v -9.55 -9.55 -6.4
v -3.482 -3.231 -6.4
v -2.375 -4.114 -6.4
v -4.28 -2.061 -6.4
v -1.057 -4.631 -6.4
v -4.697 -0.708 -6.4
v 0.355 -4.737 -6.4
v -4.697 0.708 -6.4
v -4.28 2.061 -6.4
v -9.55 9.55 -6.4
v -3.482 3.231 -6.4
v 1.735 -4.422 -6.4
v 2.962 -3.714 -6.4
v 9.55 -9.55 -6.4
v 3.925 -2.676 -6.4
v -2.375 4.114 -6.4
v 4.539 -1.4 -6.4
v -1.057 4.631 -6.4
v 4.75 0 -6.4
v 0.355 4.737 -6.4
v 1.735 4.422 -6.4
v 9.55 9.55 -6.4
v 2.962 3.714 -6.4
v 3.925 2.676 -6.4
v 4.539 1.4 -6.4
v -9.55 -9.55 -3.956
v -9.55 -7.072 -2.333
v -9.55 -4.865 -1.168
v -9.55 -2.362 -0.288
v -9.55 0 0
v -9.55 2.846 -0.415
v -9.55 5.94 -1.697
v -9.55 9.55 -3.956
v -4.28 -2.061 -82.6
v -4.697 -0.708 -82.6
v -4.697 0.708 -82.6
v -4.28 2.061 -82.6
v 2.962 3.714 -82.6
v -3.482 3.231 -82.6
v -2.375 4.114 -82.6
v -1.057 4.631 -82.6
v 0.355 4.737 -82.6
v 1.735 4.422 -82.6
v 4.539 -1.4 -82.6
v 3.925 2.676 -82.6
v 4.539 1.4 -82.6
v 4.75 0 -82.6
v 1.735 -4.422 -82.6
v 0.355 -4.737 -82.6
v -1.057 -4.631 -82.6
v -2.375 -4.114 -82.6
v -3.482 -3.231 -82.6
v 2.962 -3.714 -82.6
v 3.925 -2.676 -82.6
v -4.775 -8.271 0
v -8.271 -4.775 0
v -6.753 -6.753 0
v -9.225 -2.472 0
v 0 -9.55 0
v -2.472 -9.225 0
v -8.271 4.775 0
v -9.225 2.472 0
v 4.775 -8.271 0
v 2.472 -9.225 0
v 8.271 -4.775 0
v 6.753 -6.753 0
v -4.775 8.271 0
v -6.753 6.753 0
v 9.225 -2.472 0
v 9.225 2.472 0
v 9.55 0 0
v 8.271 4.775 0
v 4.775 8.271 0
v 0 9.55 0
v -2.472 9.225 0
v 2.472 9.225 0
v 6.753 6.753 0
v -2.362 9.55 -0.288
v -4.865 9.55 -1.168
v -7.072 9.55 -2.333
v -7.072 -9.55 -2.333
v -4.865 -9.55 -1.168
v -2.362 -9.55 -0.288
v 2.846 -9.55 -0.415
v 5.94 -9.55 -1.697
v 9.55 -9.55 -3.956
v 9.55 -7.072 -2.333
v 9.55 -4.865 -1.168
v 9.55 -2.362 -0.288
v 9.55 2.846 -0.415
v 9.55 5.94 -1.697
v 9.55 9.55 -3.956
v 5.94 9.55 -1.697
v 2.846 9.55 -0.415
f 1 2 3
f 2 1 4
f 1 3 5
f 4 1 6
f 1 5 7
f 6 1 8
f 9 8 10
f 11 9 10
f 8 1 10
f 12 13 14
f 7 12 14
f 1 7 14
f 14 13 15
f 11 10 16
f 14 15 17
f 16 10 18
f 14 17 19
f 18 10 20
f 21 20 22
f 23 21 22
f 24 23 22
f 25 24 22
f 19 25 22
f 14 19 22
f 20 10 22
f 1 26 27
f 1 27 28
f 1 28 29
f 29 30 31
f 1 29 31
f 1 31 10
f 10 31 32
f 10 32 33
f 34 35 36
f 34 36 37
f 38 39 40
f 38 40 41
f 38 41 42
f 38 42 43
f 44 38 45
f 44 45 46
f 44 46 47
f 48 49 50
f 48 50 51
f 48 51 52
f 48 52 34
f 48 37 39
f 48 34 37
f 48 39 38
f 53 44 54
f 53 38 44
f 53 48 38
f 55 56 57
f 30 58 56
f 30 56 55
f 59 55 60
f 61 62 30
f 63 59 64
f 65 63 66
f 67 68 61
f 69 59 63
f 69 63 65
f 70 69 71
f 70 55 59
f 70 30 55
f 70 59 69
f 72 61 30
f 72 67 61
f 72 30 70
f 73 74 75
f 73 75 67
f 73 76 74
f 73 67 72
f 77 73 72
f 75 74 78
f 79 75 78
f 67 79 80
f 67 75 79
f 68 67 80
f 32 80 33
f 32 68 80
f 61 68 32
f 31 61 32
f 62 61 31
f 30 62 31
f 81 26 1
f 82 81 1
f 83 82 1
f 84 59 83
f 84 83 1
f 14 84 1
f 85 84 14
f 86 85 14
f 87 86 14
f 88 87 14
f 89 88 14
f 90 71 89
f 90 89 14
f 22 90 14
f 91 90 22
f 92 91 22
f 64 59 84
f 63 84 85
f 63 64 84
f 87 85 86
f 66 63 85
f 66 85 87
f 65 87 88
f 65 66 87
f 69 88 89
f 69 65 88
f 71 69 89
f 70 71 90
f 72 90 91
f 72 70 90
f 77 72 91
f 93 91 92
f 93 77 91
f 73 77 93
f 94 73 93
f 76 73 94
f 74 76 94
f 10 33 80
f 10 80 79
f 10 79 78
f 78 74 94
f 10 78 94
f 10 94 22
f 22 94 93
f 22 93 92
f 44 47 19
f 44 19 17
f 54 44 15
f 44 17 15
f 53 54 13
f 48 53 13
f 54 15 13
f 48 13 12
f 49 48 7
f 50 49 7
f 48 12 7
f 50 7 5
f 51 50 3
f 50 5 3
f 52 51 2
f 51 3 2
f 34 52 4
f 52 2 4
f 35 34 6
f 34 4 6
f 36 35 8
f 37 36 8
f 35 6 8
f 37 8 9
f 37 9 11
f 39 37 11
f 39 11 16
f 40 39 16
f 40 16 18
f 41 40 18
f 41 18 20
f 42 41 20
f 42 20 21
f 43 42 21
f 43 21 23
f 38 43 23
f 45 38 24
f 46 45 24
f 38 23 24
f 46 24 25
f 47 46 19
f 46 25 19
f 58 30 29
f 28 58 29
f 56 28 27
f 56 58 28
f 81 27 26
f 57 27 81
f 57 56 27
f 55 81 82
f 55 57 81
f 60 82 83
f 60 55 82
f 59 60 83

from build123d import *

# Parameters (mm, degrees)
SKETCH1_W           = 19.1
SKETCH1_H           = 19.1
BOSS_EXTRUDE1_DEPTH = 6.4
SKETCH2_R           = 4.75
BOSS_EXTRUDE2_DEPTH = 76.2
SKETCH3_OUTSIDE_W   = 51.28
SKETCH3_OUTSIDE_H   = 51.28
SKETCH3_OUTSIDE_R   = 9.55
CUT_EXTRUDE2_DEPTH  = 6.4
CUT_EXTRUDE2_DRAFT  = -45


with BuildPart() as part:
    # Sketch1 → Boss-Extrude1 (new body)
    with BuildSketch(Plane.XY):
        Rectangle(SKETCH1_W, SKETCH1_H)
    extrude(amount=-BOSS_EXTRUDE1_DEPTH)

    # Sketch2 → Boss-Extrude2 (add)
    with BuildSketch(Plane(origin=(0, 0, -6.4), x_dir=(-1, 0, 0), z_dir=(0, 0, -1))):
        with Locations(Location((0, 0, 0), (0, 0, 180))):
            Circle(SKETCH2_R)
    extrude(amount=BOSS_EXTRUDE2_DEPTH)


with BuildPart() as cut_extrude2_tool:
    # Sketch3 outside → Cut-Extrude2 (with draft: the straight prism first)
    with BuildSketch(Plane.XY):
        Rectangle(SKETCH3_OUTSIDE_W, SKETCH3_OUTSIDE_H)
        Circle(SKETCH3_OUTSIDE_R, mode=Mode.SUBTRACT)
    extrude(amount=-CUT_EXTRUDE2_DEPTH)
    # Cut-Extrude2: the draft: its side faces are tilted about the plane it starts from
    cut_extrude2_sides = [cut_extrude2_tool.faces().sort_by_distance(p)[0] for p in [
        (0, -25.64, -3.2),
        (25.64, 0, -3.2),
        (0, 25.64, -3.2),
        (-25.64, 0, -3.2),
        (-9.55, 0, -3.2),
    ]]
    draft(cut_extrude2_sides, Plane.XY, CUT_EXTRUDE2_DRAFT)


with BuildPart() as part_1:
    add(part.part)

    # Cut-Extrude2: cut by cut_extrude2_tool
    add(cut_extrude2_tool.part, mode=Mode.SUBTRACT)


solid = part_1.part
